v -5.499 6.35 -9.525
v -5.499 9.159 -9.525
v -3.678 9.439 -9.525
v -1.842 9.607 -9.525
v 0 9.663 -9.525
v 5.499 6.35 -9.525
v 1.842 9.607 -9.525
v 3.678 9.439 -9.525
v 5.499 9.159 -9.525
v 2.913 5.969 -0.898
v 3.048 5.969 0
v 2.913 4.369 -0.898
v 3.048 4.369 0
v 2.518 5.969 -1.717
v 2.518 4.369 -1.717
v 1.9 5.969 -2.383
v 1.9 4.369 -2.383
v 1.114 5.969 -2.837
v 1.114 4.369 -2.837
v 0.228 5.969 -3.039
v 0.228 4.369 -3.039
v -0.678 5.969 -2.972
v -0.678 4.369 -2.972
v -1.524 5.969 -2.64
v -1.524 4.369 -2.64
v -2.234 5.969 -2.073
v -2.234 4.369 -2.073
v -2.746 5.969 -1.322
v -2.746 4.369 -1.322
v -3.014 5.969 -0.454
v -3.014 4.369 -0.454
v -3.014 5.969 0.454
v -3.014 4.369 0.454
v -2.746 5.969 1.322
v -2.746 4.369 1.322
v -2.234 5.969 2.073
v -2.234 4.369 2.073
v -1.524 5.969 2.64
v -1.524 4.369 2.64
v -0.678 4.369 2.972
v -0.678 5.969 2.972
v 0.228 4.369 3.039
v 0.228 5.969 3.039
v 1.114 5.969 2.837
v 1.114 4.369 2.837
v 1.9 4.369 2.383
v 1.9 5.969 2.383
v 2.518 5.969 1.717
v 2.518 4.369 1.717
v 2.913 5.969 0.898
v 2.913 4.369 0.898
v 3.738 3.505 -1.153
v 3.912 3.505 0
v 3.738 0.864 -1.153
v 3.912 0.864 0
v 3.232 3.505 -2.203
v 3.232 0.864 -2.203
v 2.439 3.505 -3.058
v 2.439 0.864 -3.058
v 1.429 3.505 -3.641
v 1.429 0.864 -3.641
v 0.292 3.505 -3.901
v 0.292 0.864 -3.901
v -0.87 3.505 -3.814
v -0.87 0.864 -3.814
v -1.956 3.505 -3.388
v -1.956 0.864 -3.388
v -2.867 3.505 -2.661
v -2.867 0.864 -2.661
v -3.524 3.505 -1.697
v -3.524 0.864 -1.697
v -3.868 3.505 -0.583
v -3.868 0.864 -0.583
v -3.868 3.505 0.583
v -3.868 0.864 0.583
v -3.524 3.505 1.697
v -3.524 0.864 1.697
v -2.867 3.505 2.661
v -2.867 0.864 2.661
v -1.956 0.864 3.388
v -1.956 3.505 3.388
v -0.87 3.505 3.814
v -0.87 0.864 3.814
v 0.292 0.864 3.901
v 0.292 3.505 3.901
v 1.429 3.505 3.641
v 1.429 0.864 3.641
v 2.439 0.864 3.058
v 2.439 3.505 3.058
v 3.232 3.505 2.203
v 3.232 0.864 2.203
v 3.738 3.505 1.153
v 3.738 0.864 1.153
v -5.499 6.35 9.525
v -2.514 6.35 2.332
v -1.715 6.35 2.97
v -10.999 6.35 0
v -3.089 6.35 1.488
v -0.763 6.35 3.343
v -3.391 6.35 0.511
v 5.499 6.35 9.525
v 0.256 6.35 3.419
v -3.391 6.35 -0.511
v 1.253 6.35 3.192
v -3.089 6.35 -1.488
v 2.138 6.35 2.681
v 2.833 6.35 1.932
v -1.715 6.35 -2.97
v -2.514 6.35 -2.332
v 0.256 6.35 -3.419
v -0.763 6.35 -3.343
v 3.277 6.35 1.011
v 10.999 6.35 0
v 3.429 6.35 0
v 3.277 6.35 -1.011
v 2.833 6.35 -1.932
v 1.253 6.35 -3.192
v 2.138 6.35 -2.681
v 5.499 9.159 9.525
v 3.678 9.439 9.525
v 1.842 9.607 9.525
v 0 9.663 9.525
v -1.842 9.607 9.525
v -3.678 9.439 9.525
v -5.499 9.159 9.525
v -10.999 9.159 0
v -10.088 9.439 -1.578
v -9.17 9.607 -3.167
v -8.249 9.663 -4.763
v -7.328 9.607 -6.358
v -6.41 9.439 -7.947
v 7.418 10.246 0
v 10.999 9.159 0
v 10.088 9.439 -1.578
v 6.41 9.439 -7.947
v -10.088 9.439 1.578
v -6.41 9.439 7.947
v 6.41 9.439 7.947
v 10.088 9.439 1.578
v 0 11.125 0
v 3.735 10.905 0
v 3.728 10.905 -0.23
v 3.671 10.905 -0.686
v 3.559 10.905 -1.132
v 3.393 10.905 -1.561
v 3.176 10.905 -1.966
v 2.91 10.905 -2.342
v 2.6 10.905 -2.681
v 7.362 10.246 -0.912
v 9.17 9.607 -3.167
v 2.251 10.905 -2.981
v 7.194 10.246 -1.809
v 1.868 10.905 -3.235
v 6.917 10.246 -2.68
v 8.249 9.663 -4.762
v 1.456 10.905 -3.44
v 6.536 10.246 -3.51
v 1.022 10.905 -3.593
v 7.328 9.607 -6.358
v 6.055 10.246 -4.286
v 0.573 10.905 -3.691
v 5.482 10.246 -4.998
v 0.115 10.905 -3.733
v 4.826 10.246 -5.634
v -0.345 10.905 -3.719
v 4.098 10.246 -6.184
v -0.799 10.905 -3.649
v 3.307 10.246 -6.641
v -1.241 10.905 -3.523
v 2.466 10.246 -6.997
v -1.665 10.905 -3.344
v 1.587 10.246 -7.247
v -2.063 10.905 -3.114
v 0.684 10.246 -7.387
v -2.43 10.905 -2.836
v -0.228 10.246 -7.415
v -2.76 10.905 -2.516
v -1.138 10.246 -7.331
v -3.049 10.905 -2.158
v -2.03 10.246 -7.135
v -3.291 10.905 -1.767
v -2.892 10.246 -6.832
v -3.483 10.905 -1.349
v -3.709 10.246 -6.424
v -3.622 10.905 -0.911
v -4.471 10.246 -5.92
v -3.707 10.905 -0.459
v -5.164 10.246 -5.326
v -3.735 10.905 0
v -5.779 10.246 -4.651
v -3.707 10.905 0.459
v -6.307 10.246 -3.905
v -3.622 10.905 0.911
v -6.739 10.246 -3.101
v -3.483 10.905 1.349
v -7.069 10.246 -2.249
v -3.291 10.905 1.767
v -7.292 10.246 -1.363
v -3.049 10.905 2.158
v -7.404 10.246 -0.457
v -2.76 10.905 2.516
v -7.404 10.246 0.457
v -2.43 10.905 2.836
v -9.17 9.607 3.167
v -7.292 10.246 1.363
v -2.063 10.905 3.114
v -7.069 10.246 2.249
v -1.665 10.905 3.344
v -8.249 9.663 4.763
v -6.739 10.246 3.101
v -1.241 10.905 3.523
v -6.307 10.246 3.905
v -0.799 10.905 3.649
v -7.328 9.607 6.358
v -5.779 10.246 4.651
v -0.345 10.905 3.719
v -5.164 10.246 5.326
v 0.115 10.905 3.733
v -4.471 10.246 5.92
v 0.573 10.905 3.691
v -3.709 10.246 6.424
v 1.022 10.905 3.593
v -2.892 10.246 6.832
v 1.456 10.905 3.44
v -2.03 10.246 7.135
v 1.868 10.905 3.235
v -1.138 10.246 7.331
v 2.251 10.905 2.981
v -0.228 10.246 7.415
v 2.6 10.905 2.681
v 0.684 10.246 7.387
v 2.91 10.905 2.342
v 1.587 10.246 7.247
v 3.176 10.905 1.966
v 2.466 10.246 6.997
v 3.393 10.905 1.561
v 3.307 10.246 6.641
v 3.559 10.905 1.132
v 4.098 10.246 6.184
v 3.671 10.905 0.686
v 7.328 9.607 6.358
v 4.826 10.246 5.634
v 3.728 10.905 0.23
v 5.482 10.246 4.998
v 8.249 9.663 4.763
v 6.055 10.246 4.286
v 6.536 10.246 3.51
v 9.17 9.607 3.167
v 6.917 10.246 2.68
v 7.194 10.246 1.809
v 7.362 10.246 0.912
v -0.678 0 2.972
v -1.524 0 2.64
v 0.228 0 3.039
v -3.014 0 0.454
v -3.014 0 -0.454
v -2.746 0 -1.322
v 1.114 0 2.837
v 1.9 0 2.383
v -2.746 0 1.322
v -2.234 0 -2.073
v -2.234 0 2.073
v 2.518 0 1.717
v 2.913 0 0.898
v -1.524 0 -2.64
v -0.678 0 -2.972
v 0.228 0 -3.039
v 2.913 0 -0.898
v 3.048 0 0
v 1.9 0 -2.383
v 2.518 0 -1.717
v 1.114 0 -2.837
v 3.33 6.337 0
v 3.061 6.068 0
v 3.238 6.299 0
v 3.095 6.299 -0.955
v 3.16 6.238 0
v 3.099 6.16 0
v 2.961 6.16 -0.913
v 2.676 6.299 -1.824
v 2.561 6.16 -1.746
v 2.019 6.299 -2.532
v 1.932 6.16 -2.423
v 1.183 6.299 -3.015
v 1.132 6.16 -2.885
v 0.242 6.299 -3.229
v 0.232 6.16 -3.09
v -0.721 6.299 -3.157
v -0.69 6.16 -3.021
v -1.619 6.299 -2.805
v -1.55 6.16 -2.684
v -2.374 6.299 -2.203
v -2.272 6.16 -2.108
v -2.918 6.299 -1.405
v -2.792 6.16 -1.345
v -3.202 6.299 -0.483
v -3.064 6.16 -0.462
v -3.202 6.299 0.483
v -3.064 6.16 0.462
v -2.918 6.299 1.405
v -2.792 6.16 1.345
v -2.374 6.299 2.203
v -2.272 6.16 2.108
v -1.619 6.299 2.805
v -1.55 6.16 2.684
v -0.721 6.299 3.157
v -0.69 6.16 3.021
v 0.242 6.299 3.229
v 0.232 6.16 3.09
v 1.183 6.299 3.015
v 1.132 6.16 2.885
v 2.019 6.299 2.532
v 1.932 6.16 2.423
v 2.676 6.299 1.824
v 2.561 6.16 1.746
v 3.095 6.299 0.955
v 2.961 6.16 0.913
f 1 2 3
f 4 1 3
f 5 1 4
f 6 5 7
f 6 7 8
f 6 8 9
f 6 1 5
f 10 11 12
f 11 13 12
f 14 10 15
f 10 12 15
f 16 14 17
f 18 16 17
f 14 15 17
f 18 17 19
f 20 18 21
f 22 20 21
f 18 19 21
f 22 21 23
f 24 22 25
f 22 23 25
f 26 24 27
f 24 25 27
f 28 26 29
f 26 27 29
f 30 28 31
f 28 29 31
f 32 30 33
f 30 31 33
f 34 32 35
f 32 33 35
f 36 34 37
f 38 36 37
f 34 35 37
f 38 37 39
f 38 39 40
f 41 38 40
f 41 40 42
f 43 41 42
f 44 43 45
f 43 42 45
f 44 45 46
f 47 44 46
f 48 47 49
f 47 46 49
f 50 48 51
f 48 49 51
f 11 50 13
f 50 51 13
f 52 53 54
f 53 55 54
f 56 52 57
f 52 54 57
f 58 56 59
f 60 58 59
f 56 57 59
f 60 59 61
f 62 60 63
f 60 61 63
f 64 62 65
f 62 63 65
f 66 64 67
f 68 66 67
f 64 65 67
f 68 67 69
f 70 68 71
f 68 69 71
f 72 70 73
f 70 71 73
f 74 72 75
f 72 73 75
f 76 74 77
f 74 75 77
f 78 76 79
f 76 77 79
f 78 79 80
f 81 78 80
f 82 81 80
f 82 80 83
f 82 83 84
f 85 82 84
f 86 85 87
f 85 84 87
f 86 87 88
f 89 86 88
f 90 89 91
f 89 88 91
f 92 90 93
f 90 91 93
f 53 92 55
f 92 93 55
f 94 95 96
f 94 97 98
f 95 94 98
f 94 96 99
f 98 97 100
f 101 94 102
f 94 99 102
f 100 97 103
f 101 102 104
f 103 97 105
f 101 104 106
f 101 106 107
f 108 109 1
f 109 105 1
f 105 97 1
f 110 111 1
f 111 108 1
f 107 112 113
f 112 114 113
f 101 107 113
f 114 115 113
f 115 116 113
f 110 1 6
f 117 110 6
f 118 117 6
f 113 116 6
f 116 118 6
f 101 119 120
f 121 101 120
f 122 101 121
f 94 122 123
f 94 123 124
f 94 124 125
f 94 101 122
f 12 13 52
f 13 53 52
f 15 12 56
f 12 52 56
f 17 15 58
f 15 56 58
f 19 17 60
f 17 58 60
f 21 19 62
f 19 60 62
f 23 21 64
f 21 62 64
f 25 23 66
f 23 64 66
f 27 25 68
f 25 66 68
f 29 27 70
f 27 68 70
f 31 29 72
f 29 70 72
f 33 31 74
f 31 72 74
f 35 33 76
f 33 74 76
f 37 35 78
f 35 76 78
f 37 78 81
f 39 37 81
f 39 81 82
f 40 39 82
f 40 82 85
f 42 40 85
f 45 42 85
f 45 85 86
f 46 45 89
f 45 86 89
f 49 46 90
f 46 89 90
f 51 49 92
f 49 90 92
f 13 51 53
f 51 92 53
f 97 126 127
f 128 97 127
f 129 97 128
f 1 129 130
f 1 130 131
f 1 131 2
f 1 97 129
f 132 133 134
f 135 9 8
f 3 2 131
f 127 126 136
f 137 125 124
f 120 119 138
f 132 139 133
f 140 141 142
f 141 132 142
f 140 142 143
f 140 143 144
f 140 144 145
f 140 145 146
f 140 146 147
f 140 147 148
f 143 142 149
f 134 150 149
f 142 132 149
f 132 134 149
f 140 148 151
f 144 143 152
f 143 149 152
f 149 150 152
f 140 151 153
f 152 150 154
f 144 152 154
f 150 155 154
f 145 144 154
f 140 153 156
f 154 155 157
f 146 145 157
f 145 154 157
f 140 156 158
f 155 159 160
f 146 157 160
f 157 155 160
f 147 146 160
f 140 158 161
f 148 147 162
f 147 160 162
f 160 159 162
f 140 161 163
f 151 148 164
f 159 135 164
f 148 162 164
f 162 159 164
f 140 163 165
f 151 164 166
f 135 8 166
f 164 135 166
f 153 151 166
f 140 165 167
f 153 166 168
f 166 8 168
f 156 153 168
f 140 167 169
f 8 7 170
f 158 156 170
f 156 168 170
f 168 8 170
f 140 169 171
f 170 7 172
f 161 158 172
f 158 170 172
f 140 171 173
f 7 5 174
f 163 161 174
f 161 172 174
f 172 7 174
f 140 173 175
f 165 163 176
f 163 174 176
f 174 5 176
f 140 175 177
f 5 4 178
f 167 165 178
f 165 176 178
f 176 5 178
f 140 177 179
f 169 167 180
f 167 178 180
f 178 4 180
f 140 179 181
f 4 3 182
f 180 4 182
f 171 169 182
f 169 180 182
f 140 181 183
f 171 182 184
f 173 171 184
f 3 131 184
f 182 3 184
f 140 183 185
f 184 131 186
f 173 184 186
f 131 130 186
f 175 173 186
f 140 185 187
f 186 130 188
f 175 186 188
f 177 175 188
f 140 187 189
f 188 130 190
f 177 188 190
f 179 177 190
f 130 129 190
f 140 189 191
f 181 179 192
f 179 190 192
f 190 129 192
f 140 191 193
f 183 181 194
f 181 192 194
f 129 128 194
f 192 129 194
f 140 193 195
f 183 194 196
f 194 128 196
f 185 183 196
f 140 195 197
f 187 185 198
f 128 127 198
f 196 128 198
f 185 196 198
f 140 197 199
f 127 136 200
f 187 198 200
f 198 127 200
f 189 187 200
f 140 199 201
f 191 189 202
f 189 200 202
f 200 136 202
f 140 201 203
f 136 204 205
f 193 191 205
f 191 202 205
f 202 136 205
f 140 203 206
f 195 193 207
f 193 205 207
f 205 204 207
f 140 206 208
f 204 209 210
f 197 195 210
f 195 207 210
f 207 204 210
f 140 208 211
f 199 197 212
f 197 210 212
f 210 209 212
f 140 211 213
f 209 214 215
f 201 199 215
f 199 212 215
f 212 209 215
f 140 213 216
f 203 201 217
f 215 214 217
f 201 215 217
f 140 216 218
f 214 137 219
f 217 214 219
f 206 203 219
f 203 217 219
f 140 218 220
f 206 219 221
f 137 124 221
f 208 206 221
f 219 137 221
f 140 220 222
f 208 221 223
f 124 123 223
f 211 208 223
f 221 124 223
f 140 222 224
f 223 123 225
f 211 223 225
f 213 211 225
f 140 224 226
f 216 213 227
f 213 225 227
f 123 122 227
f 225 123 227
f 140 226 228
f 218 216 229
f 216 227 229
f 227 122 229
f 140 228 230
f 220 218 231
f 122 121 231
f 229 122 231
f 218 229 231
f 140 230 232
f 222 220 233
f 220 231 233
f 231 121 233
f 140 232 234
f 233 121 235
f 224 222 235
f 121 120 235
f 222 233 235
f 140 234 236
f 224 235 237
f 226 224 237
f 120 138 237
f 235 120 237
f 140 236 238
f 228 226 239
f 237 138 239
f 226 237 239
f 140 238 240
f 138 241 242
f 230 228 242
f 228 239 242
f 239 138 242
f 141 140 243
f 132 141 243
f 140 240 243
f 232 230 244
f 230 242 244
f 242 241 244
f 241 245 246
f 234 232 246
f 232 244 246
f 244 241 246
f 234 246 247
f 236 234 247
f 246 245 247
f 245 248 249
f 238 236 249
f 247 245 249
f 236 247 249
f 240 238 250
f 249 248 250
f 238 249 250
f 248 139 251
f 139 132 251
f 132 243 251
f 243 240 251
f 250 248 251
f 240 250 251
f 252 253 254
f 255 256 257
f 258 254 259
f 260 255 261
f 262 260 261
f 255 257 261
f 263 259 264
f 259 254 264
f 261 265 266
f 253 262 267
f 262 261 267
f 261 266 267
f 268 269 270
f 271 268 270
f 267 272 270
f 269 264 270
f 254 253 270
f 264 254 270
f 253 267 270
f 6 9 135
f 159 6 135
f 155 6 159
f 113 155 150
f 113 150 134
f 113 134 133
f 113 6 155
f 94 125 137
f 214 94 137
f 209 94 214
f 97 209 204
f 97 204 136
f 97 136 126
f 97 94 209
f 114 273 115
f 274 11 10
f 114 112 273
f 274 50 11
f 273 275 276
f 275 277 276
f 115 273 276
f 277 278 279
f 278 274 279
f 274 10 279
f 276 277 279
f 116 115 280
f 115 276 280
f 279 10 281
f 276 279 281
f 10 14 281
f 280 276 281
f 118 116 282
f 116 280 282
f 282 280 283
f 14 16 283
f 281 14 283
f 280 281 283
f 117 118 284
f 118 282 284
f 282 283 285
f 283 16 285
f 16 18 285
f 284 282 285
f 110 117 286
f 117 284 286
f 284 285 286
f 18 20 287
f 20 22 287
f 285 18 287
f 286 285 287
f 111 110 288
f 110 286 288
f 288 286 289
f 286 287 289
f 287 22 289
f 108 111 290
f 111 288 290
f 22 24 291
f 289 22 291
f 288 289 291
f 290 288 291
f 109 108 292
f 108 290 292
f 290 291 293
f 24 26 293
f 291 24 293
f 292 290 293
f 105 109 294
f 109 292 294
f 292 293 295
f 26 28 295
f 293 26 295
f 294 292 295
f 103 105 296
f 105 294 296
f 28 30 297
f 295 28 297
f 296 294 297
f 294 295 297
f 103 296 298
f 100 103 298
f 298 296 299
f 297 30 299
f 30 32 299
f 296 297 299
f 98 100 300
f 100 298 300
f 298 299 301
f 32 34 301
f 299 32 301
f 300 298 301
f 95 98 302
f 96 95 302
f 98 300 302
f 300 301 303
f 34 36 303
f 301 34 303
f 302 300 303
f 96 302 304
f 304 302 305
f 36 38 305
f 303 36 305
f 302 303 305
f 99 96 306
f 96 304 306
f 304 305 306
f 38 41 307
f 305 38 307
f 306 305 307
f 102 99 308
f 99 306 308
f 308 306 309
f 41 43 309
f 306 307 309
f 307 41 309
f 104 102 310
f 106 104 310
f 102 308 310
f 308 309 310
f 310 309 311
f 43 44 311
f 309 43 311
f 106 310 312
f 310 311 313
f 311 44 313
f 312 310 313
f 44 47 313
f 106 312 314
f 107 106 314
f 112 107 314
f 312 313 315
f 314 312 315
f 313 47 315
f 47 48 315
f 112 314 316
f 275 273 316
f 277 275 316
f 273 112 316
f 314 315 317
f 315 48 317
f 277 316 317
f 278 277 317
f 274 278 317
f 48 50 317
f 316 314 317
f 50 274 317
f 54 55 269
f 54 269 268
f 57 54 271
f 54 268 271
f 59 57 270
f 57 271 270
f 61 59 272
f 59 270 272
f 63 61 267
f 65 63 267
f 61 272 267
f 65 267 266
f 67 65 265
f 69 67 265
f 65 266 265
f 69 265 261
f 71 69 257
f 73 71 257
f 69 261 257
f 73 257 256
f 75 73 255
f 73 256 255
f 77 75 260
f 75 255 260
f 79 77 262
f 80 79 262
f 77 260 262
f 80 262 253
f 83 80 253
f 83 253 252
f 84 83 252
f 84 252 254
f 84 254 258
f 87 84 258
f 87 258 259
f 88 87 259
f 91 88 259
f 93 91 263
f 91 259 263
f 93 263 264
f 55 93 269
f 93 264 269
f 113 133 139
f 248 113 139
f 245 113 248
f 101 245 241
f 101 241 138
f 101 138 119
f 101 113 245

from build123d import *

# Parameters (mm, degrees)
CUT_EXTRUDE2_DEPTH = 11.1252


with BuildPart() as part:
    # Sketch3 → Revolve1 (revolve)
    with BuildSketch(Plane.XY):
        with BuildLine():
            Line((3.9116, 3.5052), (3.9116, 0.8636))
            Line((3.9116, 0.8636), (3.048, 0))
            Line((3.048, 0), (0, 0))
            Line((0, 0), (0, 11.1252))
            ThreePointArc((0, 11.1252), (5.586411751, 10.629871711), (10.9985175, 9.159341969))
            Line((10.9985175, 9.159341969), (10.9985175, 6.35))
            Line((10.9985175, 6.35), (3.429, 6.35))
            ThreePointArc((3.429, 6.35), (3.159592316, 6.238407684), (3.048, 5.969))
            Line((3.048, 5.969), (3.048, 4.3688))
            Line((3.048, 4.3688), (3.9116, 3.5052))
        make_face()
    revolve(axis=Axis((0, -1000, 0), (0, 1, 0)))

    # Sketch1 → Cut-Extrude2 (cut)
    with BuildSketch(Plane(origin=(0, 0, 0), x_dir=(1, 0, 0), z_dir=(0, 1, 0))):
        with BuildLine():
            ThreePointArc((-5.499261314, -9.525), (0, -10.998522628), (5.499261314, -9.525))
            Line((5.499261314, -9.525), (-5.499261314, -9.525))
        make_face()
        with BuildLine():
            ThreePointArc((-10.998522628, 0), (-9.525, -5.499261314), (-5.499261314, -9.525))
            Line((-5.499261314, -9.525), (-10.998522628, 0))
        make_face()
        with BuildLine():
            ThreePointArc((5.499261314, -9.525), (9.525, -5.499261314), (10.998522628, 0))
            Line((10.998522628, 0), (5.499261314, -9.525))
        make_face()
        with BuildLine():
            Line((5.499261314, 9.525), (10.998522628, 0))
            ThreePointArc((10.998522628, 0), (9.525, 5.499261314), (5.499261314, 9.525))
        make_face()
        with BuildLine():
            Line((-5.499261314, 9.525), (5.499261314, 9.525))
            ThreePointArc((5.499261314, 9.525), (0, 10.998522628), (-5.499261314, 9.525))
        make_face()
        with BuildLine():
            Line((-10.998522628, 0), (-5.499261314, 9.525))
            ThreePointArc((-5.499261314, 9.525), (-9.525, 5.499261314), (-10.998522628, 0))
        make_face()
    extrude(amount=CUT_EXTRUDE2_DEPTH, mode=Mode.SUBTRACT)


solid = part.part
